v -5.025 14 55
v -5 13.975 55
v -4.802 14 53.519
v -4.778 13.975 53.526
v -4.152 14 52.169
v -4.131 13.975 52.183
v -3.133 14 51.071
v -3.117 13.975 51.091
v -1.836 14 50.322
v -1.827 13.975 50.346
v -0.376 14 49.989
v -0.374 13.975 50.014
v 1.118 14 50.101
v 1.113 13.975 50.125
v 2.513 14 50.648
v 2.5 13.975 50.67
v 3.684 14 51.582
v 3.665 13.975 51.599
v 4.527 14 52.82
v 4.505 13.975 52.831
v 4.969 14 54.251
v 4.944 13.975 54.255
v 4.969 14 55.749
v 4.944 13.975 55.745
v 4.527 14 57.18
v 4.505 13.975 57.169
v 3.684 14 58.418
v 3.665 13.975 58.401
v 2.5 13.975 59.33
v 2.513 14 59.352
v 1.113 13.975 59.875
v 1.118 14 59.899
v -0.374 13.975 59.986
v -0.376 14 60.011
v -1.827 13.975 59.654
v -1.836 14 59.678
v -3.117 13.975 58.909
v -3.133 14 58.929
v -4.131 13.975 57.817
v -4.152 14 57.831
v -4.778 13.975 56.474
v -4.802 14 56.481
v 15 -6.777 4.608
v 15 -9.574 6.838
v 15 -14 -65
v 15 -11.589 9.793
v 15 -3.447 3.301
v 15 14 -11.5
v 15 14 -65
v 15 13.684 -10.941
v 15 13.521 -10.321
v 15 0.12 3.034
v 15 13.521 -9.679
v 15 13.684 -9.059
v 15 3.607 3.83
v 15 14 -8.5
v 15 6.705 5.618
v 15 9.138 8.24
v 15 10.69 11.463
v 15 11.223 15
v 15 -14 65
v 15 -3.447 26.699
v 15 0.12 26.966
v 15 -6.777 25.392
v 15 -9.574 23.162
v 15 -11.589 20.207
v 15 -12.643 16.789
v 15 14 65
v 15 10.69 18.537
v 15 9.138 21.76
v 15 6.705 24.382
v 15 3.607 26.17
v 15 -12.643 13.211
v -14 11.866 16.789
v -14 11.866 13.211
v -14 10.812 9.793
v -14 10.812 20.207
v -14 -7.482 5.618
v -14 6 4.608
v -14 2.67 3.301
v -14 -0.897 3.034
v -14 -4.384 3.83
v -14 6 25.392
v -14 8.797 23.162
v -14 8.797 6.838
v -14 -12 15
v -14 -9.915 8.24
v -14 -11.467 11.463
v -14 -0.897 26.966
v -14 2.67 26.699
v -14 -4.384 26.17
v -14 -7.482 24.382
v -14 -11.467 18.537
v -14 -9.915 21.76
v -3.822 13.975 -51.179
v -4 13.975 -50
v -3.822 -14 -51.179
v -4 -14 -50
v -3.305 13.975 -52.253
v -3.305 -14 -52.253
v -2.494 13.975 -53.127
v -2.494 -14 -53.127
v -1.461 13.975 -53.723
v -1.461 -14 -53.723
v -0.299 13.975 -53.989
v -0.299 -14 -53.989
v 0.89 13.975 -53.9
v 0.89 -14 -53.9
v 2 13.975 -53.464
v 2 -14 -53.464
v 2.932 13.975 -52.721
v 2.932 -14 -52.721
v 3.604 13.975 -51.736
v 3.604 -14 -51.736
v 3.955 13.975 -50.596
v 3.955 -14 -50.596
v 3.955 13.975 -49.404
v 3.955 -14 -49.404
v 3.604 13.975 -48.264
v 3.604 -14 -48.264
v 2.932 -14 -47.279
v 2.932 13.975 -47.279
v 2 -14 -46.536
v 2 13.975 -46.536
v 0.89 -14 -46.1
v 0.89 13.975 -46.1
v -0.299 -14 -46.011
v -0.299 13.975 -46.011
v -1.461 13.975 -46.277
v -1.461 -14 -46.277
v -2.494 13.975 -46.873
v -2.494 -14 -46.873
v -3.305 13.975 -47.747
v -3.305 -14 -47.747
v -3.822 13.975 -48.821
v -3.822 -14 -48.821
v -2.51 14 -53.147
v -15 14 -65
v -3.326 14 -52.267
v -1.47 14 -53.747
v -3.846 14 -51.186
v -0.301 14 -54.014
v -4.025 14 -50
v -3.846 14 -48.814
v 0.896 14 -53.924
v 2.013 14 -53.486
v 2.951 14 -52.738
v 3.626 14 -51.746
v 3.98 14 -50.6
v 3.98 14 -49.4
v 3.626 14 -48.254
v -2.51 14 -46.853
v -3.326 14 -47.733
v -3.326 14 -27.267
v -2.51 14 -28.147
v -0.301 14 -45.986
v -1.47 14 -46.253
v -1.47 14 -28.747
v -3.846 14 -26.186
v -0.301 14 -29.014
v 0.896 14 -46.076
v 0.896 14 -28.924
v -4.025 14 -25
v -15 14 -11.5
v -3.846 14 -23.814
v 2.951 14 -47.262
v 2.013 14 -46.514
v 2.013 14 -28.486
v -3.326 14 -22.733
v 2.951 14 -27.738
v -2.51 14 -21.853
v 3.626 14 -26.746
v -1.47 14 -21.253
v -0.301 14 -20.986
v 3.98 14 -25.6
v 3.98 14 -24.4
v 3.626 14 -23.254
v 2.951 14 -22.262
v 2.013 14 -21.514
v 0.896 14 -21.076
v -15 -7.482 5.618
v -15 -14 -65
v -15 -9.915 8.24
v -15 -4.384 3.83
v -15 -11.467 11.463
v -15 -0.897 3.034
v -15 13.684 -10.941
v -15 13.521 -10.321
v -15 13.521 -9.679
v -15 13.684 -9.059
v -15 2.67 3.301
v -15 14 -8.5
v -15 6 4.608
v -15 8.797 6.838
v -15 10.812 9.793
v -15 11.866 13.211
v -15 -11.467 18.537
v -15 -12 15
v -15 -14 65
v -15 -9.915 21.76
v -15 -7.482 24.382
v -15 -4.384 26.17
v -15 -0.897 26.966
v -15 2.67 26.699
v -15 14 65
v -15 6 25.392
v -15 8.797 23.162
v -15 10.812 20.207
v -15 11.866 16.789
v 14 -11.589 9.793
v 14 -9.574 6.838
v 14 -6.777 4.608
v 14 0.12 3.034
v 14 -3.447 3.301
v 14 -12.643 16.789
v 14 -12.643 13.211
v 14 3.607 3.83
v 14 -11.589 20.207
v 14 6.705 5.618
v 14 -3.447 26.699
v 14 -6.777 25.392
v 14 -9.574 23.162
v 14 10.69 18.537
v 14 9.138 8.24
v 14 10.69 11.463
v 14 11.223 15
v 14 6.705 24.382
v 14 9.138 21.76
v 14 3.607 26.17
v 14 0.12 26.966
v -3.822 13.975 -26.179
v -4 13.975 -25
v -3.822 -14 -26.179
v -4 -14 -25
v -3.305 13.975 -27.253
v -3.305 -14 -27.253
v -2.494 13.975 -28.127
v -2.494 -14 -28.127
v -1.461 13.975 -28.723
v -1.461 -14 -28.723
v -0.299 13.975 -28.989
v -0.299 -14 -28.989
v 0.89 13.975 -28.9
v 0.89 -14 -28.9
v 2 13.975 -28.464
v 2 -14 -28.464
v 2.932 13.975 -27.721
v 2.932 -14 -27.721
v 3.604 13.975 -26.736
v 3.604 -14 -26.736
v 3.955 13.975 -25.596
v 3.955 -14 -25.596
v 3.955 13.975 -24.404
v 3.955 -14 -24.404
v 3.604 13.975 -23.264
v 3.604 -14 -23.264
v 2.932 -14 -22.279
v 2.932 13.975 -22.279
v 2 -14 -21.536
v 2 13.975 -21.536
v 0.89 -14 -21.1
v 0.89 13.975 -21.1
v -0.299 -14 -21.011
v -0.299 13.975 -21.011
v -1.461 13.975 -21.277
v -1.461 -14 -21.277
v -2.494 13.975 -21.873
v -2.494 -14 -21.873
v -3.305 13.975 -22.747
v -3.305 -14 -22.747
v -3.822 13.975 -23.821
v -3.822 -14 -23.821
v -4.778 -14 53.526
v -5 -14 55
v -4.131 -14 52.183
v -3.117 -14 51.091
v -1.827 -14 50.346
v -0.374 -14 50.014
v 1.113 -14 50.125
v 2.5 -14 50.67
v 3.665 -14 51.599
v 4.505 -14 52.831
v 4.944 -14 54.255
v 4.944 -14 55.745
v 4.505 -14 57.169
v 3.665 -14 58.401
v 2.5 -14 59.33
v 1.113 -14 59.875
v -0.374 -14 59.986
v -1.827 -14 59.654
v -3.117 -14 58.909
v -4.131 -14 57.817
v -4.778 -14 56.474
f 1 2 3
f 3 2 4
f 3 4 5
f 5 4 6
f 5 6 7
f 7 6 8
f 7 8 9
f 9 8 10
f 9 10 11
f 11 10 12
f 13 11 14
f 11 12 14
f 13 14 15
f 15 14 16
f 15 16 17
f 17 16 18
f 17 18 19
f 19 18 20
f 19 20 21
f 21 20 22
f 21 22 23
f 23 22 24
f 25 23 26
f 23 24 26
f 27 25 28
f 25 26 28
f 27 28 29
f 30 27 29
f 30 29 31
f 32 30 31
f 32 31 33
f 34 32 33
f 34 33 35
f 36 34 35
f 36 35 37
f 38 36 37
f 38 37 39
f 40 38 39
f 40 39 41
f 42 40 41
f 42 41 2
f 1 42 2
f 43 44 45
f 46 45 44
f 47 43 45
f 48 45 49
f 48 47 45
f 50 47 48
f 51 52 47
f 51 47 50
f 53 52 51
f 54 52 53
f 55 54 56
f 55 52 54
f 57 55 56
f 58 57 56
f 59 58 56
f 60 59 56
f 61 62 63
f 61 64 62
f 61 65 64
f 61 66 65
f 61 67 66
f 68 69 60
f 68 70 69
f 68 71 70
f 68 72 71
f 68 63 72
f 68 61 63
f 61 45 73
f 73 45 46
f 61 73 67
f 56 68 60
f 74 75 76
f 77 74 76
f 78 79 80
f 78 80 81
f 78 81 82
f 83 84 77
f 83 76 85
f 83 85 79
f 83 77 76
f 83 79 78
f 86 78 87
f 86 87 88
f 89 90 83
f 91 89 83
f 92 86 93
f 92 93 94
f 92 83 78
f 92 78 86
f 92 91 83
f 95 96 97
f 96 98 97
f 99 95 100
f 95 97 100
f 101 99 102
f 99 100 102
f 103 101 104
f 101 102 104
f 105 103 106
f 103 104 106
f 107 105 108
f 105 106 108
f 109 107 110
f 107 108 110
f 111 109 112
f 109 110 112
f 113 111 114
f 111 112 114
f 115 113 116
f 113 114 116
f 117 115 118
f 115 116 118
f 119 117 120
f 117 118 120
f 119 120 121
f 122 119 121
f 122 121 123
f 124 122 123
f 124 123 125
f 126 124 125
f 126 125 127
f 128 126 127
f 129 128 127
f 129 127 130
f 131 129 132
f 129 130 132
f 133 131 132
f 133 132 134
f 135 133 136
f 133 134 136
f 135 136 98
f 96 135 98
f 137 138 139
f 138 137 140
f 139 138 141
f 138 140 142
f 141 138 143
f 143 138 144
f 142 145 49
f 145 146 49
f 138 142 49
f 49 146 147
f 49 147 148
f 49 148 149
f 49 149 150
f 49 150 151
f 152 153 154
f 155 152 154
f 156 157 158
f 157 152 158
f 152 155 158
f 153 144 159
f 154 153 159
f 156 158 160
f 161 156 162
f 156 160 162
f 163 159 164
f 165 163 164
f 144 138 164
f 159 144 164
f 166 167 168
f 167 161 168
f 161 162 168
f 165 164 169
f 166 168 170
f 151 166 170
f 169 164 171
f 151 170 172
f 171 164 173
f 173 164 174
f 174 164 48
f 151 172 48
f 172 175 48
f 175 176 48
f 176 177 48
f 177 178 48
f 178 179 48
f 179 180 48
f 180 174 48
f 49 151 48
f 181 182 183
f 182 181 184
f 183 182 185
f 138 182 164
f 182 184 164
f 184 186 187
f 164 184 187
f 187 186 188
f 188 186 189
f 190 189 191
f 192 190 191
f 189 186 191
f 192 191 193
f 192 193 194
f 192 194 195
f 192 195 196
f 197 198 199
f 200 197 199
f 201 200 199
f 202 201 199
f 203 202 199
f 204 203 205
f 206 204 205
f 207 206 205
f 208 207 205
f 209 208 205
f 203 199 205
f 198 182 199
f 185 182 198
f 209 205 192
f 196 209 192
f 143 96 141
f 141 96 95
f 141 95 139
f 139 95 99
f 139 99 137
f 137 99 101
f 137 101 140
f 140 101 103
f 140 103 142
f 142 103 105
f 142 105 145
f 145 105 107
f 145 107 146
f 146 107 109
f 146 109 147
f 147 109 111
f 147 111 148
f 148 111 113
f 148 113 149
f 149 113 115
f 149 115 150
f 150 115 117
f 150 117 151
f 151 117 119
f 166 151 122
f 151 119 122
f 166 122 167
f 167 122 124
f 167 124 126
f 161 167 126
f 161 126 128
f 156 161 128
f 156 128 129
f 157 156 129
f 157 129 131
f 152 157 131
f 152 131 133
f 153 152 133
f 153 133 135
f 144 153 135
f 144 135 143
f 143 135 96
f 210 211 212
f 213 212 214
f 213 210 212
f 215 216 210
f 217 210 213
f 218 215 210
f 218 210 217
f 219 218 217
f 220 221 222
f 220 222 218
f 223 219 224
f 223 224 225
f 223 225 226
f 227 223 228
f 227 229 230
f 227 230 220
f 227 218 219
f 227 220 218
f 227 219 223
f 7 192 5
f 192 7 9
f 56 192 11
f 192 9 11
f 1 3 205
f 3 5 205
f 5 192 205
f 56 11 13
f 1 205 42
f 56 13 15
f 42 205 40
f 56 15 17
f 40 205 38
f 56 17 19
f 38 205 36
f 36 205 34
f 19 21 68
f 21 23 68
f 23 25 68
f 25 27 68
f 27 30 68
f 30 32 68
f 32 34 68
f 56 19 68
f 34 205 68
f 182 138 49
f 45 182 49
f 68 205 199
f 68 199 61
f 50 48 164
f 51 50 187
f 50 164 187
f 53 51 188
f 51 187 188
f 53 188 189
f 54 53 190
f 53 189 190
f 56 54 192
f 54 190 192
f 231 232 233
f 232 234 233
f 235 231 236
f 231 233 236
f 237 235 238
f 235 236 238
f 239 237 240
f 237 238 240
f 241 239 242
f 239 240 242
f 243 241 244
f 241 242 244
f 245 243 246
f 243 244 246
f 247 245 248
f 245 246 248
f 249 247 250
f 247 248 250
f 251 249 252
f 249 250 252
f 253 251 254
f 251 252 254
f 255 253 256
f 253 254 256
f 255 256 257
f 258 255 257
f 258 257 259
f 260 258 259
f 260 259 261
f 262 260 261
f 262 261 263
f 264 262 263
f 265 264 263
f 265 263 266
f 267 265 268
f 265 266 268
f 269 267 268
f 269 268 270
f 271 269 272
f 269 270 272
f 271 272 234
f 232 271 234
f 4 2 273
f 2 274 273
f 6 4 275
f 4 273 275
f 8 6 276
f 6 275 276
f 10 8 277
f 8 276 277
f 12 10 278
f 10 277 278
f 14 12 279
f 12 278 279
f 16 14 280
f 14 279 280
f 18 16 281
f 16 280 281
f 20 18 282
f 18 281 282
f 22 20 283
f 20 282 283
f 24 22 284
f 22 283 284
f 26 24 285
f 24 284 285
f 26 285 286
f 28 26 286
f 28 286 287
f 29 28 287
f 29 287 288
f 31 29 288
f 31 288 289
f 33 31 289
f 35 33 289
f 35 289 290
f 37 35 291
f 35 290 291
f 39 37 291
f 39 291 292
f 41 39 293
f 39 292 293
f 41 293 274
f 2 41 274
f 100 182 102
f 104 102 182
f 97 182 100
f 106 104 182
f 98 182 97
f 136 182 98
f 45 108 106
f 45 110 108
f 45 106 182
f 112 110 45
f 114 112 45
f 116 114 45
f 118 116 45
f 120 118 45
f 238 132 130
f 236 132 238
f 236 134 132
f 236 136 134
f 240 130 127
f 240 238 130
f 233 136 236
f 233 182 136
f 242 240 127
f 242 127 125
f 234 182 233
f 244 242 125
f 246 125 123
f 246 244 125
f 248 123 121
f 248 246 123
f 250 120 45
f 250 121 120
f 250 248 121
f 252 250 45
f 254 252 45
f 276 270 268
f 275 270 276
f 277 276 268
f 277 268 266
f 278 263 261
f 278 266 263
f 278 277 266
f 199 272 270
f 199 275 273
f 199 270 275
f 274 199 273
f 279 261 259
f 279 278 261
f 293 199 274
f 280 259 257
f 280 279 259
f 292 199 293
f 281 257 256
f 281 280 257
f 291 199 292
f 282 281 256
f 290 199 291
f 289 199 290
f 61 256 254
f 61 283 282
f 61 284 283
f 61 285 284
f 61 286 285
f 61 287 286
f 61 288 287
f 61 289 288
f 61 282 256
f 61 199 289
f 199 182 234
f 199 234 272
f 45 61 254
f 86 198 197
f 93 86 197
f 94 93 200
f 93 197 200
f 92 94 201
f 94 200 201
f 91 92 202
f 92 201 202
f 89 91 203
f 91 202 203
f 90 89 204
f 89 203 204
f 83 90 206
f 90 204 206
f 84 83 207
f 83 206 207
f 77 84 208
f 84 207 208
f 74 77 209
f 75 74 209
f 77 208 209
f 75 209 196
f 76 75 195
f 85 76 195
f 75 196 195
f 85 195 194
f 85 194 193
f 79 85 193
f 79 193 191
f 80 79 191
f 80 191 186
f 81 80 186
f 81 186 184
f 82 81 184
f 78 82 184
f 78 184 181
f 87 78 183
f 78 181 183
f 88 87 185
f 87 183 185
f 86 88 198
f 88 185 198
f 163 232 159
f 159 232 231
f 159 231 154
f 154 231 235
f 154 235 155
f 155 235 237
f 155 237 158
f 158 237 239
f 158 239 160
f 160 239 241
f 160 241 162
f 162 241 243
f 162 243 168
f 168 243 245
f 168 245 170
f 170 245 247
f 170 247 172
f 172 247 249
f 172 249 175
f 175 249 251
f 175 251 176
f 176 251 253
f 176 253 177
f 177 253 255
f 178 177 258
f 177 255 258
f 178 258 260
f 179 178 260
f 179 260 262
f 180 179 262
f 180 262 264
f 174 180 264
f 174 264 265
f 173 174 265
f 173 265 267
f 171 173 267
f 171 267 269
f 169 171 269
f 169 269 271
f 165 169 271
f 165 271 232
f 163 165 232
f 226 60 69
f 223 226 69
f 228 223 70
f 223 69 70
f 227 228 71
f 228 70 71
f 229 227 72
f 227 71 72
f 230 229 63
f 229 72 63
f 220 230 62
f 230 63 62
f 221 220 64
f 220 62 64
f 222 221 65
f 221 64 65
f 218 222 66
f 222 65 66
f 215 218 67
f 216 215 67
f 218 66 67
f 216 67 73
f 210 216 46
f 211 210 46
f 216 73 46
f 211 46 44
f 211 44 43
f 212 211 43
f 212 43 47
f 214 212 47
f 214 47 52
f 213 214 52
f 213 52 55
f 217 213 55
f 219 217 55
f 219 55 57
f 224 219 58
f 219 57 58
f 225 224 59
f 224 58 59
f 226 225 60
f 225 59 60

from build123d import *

# Parameters (mm, degrees)
SKETCH_1_W                        = 30
SKETCH_1_H                        = 28
EXTRUDE_1_DEPTH                   = 65
SKETCH_2_R                        = 2.5
CUT_EXTRUDE_1_DEPTH               = 73.945184899
HOLE_WIZARD_8_0_8_1_D             = 8
HOLE_WIZARD_8_0_8_1_CSINK_D       = 8.05
HOLE_WIZARD_8_0_8_1_CSINK_ANGLE   = 90
HOLE_WIZARD_10_0_10_1_D           = 10
HOLE_WIZARD_10_0_10_1_CSINK_D     = 10.05
HOLE_WIZARD_10_0_10_1_CSINK_ANGLE = 90
SKETCH_7_R                        = 12
CUT_EXTRUDE_2_DEPTH               = 1
SKETCH_9_R                        = 12
CUT_EXTRUDE_3_DEPTH               = 1


with BuildPart() as part:
    # 草图1 → 凸台-拉伸1 (new, symmetric)
    with BuildSketch(Plane.XY):
        Rectangle(SKETCH_1_W, SKETCH_1_H)
    extrude(amount=EXTRUDE_1_DEPTH, both=True)

    # 草图2 → 切除-拉伸1 (cut, through all)
    with BuildSketch(Plane.ZY.offset(15)):
        with Locations((-10, 16)):
            Circle(SKETCH_2_R)
    extrude(amount=-CUT_EXTRUDE_1_DEPTH, mode=Mode.SUBTRACT)

    # Ø8.0 (8) 直径孔1 (through all)
    with Locations(Plane(origin=(0, 14, 0), x_dir=(1, 0, 0), z_dir=(0, 1, 0))):
        with Locations((0, 25), (0, 50)):
            CounterSinkHole(HOLE_WIZARD_8_0_8_1_D / 2, HOLE_WIZARD_8_0_8_1_CSINK_D / 2, counter_sink_angle=HOLE_WIZARD_8_0_8_1_CSINK_ANGLE)

    # Ø10.0 (10) 直径孔1 (through all)
    with Locations(Plane(origin=(0, 14, 0), x_dir=(1, 0, 0), z_dir=(0, 1, 0))):
        with Locations((0, -55)):
            CounterSinkHole(HOLE_WIZARD_10_0_10_1_D / 2, HOLE_WIZARD_10_0_10_1_CSINK_D / 2, counter_sink_angle=HOLE_WIZARD_10_0_10_1_CSINK_ANGLE)

    # 草图7 → 切除-拉伸2 (cut)
    with BuildSketch(Plane.ZY.offset(15)):
        with Locations(Location((15, 0, 0), (0, 0, 270))):
            Circle(SKETCH_7_R)
    extrude(amount=-CUT_EXTRUDE_2_DEPTH, mode=Mode.SUBTRACT)

    # 草图9 → 切除-拉伸3 (cut)
    with BuildSketch(Plane(origin=(15, 0, 0), x_dir=(0, 0, -1), z_dir=(1, 0, 0))):
        with Locations(Location((-15, -0.777034021, 0), (0, 0, 90))):
            Circle(SKETCH_9_R)
    extrude(amount=-CUT_EXTRUDE_3_DEPTH, mode=Mode.SUBTRACT)


solid = part.part
